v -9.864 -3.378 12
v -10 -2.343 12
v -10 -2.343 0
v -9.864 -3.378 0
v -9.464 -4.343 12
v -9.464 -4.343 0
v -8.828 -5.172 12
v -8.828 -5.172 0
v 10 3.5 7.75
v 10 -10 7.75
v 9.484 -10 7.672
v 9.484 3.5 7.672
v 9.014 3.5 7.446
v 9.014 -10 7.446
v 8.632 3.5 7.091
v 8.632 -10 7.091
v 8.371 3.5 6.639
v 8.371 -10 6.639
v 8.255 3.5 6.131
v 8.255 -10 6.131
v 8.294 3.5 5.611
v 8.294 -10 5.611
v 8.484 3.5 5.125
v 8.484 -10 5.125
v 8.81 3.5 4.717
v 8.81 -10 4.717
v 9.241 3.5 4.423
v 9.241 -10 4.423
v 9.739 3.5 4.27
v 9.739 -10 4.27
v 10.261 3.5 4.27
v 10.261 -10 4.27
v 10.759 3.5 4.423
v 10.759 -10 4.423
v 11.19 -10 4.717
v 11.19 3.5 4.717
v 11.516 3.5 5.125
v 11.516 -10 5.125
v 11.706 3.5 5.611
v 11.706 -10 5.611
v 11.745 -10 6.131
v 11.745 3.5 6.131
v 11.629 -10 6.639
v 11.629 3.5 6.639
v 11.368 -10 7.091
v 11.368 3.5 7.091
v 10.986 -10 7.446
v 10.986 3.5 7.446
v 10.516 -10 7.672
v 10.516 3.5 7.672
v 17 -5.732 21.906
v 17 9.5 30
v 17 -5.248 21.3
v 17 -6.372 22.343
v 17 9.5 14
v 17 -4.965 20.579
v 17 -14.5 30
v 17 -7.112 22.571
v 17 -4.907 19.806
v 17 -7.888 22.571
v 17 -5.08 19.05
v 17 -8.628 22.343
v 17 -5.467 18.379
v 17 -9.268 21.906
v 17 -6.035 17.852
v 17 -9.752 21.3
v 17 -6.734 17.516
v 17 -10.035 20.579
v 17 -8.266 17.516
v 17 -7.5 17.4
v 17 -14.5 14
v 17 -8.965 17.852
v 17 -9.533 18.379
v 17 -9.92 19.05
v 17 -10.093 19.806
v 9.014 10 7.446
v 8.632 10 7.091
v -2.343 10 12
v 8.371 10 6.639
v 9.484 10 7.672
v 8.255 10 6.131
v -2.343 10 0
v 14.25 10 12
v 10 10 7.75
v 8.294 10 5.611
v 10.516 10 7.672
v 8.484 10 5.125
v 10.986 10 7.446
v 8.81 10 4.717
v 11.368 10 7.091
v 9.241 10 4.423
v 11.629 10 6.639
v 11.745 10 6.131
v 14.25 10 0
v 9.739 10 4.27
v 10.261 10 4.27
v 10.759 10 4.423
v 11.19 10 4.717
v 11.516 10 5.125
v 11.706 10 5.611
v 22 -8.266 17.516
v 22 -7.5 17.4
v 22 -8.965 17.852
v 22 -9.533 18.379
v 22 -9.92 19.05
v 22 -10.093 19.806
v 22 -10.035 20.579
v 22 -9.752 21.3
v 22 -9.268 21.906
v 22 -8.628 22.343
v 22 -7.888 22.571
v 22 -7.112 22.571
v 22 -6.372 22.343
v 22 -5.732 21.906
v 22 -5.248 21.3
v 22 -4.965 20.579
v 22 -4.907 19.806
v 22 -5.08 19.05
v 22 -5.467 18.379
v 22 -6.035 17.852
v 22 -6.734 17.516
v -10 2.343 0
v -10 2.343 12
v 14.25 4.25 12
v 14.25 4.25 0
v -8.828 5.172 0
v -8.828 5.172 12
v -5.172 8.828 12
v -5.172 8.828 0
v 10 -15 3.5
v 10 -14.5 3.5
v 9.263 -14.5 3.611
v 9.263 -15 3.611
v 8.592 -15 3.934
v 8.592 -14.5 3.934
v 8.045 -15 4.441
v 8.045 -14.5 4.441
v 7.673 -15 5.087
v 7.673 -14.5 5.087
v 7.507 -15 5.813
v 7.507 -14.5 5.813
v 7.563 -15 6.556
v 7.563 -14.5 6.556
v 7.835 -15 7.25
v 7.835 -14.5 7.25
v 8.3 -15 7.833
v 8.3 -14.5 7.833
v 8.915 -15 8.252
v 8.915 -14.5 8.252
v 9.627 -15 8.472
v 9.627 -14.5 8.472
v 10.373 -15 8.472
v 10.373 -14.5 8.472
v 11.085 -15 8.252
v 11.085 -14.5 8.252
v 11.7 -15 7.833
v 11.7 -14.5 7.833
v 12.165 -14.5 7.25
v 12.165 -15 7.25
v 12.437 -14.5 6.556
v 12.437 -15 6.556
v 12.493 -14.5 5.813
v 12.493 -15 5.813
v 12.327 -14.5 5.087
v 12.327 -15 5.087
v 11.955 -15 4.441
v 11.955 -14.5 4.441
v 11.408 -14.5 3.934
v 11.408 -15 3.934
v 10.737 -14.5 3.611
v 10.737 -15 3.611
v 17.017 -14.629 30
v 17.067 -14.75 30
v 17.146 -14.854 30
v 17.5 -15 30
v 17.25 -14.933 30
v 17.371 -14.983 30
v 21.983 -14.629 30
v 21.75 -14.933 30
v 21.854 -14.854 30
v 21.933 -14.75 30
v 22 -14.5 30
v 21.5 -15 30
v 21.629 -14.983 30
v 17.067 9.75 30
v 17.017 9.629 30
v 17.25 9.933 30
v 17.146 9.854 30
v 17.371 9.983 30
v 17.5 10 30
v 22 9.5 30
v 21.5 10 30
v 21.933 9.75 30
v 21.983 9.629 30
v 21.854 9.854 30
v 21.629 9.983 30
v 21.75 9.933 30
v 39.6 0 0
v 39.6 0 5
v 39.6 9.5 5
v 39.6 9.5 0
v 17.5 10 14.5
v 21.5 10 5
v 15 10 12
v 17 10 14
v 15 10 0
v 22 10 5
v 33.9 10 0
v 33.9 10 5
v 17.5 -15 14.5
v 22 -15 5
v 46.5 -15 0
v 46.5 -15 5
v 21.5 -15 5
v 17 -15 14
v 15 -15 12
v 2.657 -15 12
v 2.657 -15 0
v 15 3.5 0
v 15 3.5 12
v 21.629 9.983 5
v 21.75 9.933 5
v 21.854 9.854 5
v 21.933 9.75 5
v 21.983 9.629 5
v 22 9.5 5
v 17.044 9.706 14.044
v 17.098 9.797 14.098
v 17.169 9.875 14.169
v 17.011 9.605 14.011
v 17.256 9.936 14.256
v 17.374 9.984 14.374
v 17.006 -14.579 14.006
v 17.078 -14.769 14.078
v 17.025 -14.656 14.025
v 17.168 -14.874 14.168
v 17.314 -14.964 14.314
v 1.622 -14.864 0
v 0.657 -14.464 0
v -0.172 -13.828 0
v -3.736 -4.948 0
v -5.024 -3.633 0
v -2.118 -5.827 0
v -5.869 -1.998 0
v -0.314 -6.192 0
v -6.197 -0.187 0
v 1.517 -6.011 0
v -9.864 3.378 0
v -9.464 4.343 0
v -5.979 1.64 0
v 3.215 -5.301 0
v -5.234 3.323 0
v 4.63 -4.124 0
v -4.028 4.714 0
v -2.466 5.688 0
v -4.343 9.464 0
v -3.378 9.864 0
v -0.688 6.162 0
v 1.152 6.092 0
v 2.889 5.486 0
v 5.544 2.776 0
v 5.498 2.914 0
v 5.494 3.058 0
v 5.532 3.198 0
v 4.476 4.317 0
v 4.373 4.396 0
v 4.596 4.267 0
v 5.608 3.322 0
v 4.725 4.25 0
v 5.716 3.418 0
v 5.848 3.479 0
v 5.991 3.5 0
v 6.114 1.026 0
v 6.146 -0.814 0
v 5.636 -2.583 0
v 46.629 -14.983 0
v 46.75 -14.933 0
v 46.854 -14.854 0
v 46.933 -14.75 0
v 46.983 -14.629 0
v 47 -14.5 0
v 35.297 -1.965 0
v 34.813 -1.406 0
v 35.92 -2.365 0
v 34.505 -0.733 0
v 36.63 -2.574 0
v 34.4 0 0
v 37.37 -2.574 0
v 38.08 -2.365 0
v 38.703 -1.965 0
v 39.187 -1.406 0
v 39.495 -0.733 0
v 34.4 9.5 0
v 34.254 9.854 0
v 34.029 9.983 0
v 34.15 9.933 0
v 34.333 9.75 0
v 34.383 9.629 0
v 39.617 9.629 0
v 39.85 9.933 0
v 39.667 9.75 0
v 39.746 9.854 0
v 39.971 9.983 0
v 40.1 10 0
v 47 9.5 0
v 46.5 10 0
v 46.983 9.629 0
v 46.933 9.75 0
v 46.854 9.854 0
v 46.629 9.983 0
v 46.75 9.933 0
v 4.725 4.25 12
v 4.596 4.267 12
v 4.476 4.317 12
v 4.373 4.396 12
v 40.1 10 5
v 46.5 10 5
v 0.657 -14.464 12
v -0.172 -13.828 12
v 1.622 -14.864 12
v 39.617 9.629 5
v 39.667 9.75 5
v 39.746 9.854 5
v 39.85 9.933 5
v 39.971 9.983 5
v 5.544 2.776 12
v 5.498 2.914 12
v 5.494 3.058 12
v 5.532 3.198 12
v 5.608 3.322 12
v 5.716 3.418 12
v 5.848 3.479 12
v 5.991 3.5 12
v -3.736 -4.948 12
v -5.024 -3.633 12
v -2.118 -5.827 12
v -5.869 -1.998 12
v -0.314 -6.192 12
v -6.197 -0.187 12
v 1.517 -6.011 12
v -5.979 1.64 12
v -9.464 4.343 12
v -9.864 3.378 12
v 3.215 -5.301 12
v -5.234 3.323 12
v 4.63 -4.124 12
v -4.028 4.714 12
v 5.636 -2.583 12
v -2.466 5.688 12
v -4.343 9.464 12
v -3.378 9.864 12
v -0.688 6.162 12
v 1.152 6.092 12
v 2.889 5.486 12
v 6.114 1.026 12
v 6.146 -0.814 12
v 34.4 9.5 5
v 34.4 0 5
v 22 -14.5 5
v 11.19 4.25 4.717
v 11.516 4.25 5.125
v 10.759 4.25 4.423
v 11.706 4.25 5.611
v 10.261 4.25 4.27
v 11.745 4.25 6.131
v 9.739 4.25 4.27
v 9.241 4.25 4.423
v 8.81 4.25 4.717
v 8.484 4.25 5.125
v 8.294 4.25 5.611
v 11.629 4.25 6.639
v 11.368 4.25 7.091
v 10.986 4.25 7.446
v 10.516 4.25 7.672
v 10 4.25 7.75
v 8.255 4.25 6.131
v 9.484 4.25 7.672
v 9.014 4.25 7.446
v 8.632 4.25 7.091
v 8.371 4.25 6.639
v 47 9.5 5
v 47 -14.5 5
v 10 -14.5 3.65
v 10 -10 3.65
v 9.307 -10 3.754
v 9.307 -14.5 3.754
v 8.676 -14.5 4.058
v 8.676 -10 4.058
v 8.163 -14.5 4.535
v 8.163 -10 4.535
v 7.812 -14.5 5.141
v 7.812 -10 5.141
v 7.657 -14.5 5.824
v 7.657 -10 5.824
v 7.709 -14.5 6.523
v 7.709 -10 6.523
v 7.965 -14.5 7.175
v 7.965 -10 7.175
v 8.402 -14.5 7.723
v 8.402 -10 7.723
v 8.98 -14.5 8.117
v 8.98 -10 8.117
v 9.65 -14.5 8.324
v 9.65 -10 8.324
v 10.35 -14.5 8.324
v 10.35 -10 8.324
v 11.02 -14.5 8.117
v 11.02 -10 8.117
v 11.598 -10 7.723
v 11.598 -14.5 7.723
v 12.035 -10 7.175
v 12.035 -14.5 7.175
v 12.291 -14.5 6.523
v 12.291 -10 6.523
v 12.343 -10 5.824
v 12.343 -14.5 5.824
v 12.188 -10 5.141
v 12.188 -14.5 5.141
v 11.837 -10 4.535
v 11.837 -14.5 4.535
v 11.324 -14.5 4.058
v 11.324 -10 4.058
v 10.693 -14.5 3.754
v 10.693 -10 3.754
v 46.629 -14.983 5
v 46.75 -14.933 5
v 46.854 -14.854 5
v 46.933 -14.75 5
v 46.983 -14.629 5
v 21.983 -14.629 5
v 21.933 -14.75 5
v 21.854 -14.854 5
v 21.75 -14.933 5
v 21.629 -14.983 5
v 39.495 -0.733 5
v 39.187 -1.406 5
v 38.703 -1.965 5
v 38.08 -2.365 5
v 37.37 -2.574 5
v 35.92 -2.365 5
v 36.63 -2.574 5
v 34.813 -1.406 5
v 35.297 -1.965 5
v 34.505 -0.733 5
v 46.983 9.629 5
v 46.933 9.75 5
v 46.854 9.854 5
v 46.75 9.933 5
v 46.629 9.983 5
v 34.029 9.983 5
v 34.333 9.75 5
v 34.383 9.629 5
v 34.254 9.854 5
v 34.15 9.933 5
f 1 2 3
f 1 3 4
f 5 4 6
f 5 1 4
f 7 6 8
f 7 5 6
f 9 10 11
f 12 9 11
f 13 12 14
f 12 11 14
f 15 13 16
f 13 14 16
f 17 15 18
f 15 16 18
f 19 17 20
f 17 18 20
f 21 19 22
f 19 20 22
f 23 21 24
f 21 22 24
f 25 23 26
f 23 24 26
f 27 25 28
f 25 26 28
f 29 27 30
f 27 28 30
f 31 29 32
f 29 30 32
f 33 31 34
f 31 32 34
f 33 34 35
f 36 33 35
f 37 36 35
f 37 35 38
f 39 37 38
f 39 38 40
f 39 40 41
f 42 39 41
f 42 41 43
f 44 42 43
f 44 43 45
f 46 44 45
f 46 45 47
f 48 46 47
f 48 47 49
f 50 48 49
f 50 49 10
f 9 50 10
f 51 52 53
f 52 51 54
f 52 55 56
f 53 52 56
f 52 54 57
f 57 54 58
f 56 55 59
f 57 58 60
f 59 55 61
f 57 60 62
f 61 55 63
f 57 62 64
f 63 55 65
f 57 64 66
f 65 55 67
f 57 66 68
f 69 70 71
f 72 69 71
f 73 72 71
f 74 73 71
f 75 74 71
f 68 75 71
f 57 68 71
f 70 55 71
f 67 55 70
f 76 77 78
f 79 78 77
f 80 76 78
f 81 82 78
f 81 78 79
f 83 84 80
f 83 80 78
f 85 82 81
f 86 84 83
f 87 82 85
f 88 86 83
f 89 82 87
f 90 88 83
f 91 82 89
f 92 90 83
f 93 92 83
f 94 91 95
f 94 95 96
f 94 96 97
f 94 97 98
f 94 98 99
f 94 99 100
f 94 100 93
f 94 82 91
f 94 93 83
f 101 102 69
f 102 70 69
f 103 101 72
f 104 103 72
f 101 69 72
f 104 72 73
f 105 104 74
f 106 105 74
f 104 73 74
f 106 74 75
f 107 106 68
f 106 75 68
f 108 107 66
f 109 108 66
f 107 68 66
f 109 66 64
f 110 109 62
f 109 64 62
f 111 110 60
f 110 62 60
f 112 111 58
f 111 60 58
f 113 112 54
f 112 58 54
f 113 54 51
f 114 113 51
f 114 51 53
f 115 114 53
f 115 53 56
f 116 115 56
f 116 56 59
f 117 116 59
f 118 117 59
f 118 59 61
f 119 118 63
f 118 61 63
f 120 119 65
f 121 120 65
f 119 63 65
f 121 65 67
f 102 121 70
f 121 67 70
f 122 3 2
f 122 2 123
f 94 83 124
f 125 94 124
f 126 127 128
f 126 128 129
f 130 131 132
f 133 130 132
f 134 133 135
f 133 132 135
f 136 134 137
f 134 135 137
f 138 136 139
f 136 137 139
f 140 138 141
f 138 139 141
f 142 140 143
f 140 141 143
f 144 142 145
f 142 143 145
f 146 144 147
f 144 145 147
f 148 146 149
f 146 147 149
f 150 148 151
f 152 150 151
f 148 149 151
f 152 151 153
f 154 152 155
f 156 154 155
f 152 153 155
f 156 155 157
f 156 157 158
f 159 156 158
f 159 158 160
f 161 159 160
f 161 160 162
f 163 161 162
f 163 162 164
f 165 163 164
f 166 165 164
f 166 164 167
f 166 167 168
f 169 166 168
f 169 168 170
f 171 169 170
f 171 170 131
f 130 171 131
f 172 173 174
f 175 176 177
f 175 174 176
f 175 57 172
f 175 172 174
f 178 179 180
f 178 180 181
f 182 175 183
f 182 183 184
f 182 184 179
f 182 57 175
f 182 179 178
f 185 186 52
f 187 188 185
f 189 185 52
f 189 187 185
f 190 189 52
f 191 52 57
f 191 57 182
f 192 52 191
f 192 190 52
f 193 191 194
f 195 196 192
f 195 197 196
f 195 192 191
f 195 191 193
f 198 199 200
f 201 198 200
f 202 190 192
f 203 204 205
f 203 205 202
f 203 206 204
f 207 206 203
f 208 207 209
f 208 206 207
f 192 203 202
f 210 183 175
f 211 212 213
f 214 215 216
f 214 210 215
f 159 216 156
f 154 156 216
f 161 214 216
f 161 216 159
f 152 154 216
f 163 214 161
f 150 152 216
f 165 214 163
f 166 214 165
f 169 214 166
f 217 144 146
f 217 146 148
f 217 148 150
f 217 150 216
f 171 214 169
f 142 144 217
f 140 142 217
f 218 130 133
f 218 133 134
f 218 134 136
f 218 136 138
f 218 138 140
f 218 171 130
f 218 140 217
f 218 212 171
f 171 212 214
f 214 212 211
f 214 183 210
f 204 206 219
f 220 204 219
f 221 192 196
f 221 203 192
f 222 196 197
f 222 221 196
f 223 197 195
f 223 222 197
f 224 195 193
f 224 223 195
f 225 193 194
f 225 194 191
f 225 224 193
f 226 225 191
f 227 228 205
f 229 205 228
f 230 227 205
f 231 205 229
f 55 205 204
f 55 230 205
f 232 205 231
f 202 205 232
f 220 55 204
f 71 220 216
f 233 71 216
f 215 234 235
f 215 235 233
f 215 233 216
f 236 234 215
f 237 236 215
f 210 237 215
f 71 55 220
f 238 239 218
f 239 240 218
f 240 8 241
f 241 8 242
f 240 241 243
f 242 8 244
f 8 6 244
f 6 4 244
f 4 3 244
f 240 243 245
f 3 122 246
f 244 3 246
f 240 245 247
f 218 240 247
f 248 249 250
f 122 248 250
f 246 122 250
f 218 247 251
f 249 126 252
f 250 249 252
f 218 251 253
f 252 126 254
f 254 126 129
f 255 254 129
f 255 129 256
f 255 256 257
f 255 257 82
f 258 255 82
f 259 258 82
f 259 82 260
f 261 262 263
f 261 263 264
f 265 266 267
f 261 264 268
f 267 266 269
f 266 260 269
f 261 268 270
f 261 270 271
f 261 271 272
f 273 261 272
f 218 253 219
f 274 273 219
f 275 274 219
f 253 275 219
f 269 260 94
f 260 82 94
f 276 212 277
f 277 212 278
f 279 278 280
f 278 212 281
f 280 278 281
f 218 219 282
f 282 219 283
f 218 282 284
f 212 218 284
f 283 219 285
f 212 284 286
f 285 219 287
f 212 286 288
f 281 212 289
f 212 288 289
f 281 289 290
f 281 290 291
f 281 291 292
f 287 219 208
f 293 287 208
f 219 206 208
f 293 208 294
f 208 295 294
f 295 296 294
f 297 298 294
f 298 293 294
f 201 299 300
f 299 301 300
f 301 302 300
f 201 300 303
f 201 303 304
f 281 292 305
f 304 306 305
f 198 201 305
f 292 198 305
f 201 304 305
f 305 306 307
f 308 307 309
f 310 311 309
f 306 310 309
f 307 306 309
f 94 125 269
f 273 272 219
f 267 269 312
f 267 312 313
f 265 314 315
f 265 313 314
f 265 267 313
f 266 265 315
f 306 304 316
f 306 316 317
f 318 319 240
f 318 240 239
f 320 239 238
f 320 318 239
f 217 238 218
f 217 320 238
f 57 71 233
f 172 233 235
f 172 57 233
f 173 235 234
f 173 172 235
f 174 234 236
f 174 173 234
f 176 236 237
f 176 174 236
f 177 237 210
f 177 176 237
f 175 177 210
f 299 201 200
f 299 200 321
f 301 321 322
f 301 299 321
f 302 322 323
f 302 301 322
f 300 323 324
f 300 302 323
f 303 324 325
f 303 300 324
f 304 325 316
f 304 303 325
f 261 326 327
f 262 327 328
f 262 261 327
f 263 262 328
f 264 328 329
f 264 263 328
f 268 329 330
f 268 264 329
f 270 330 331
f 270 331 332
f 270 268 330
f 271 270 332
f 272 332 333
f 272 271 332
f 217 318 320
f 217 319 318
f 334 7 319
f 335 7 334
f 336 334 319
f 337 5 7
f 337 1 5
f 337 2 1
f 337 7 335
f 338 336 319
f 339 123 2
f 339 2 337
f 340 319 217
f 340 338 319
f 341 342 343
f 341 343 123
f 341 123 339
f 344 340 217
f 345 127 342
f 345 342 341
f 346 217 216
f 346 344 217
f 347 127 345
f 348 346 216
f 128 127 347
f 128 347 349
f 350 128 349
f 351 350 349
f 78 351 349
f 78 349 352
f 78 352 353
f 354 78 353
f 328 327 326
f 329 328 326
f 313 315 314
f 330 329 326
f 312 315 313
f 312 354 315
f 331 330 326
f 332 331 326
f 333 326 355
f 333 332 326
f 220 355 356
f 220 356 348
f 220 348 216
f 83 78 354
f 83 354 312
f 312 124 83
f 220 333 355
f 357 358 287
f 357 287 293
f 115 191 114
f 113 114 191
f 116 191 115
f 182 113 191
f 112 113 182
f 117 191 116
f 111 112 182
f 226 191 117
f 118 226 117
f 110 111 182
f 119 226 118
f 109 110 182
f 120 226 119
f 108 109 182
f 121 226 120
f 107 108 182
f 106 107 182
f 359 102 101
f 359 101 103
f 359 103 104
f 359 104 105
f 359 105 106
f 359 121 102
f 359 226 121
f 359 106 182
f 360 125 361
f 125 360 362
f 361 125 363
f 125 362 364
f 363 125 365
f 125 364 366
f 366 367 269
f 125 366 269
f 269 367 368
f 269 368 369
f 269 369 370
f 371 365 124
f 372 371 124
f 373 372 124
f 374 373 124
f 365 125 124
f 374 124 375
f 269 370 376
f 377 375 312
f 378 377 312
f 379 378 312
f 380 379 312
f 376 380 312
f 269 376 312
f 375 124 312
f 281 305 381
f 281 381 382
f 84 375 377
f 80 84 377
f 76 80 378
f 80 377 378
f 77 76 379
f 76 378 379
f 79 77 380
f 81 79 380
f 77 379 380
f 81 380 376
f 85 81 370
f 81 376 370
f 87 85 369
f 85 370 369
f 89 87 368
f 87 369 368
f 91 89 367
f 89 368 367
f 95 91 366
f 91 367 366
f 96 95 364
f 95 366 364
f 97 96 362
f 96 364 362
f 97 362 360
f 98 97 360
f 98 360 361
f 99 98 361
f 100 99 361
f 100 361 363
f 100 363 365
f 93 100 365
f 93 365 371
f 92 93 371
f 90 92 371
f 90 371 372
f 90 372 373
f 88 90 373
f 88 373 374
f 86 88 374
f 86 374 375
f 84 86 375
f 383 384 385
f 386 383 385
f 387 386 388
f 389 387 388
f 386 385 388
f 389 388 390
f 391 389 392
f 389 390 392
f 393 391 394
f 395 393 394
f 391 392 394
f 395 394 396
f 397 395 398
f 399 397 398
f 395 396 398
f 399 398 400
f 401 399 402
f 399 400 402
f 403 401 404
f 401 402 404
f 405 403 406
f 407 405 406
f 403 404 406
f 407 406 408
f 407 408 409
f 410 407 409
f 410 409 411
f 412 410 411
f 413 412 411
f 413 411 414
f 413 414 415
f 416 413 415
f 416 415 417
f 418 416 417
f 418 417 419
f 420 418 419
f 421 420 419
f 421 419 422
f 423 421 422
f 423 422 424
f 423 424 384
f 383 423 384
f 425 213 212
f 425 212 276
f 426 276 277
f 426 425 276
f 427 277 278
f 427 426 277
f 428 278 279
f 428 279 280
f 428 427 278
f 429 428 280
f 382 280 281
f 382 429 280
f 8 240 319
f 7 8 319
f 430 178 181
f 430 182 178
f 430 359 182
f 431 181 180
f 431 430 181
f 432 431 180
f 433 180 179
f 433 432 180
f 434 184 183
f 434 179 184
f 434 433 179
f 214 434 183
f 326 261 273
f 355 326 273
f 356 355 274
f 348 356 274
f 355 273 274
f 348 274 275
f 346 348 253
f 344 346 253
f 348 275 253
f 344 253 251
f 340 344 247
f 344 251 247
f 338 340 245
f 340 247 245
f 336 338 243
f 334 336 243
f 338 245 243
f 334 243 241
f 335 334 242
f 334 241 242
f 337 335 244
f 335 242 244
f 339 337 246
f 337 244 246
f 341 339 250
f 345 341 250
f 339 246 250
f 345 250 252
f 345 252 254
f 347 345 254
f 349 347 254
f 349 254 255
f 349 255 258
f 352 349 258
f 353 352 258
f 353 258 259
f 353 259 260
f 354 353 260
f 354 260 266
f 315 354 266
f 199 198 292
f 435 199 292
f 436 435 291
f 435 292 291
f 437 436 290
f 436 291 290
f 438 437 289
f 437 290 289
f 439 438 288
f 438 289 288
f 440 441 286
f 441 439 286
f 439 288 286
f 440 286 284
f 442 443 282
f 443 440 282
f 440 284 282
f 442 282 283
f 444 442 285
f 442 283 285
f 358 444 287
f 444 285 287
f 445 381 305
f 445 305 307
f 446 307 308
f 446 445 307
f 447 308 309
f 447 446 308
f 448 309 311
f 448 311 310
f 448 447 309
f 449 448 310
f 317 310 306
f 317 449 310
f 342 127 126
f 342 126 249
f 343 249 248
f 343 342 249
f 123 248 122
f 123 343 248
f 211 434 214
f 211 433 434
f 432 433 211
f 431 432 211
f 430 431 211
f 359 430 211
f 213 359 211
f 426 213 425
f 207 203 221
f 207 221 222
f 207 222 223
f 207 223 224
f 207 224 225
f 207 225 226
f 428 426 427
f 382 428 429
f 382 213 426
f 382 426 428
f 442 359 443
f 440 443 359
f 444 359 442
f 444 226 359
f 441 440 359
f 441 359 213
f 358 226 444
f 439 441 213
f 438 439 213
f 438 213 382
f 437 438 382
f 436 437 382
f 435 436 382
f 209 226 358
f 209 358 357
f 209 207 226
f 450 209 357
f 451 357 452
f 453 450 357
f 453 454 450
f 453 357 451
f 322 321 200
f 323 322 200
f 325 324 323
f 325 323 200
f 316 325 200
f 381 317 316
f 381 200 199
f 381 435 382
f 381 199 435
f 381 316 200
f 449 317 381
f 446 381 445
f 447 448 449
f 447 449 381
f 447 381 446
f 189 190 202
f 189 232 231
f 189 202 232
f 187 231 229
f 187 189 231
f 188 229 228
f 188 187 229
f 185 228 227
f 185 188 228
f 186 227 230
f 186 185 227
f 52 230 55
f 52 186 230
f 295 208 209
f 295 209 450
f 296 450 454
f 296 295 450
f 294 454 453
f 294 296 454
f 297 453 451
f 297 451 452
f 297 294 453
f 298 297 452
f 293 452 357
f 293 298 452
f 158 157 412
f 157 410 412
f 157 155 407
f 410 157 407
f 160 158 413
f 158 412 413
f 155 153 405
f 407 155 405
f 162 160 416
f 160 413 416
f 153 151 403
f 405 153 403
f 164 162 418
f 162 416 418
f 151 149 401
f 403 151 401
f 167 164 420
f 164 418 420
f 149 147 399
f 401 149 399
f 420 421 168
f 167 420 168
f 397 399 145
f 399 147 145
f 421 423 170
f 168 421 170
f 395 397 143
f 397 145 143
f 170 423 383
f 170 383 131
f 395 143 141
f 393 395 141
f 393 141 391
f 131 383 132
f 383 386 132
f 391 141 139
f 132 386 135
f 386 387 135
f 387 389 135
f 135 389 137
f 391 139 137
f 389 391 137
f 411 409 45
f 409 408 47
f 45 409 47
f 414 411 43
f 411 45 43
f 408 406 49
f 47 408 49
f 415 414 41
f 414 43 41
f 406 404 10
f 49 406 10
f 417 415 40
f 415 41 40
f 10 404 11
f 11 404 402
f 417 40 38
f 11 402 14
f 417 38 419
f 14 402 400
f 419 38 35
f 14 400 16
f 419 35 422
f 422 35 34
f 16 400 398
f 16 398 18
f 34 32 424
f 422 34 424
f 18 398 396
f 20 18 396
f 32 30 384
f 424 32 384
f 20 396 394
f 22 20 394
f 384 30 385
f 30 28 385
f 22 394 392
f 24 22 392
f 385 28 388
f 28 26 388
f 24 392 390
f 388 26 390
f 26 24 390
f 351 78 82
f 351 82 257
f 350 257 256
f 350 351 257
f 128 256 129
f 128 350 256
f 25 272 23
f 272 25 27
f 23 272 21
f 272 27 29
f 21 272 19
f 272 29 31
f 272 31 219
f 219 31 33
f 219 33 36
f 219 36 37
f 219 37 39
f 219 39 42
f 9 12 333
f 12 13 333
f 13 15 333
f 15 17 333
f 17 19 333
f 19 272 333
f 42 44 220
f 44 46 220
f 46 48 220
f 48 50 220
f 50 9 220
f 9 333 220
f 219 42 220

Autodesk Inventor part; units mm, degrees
ref_plane "YZ Plane" through (0, 0, 0) normal (1, 0, 0) x (0, 1, 0)
ref_plane "XZ Plane" through (0, 0, 0) normal (0, 1, 0) x (-1, 0, 0)
ref_plane "XY Plane" through (0, 0, 0) normal (0, 0, 1) x (1, 0, 0)
sketch "Sketch1" plane through (0, 0, 0) normal (0, 0, 1) x (1, 0, 0)
  circle A0 centre (0, 0) radius 6.2
  line L0 (0, 0) -> (83.2978, 0) construction
  circle A1 centre (37, 0) radius 2.6
  line L1 (-10, 10) -> (47, 10)
  line L2 (47, 10) -> (47, -15)
  line L3 (47, -15) -> (-10, -15)
  line L4 (-10, -15) -> (-10, 10)
  line L5 (22, 29.5766) -> (22, -18.8569) construction
  dimension "d0" = 12.4
  dimension "d1" = 5.2
  dimension "d2" = 37
  dimension "d3" = 10
  dimension "d4" = 15
  dimension "d5" = 10
  dimension "d6" = 22
  dimension "d7" = 25
extrude "Extrusion1" add sketch "Sketch1" along normal blind 5
sketch "Sketch2" plane through (0, 0, 5) normal (0, 0, 1) x (1, 0, 0)
  circle A0 centre (0, 0) radius 6.2 projected
  circle A1 centre (37, 0) radius 2.6 projected
  line L0 (47, 10) -> (-10, 10) projected
  line L1 (-10, 10) -> (-10, -15) projected
  line L2 (-10, -15) -> (47, -15) projected
  line L3 (47, -15) -> (47, 10) projected
  line L4 (22, 10) -> (22, -15)
  dimension "d10" = 22
extrude "Extrusion2" add sketch "Sketch2" along normal blind 7 contours L4 L2 L1 L0
sketch "Sketch3" plane through (0, 0, 12) normal (0, 0, 1) x (1, 0, 0)
  point P0 (0, 0)
sketch "Sketch4" plane through (0, 0, 5) normal (0, 0, 1) x (1, 0, 0)
  circle A0 centre (0, 0) radius 6.2 projected
  line L0 (-10, 10) -> (-10, -15) projected
  line L1 (-10, -15) -> (22, -15) projected
  line L2 (22, -15) -> (22, 10) projected
  line L3 (22, 10) -> (-10, 10) projected
  line L4 (22, 10) -> (17, 10)
  line L5 (17, 10) -> (17, -15)
  line L6 (17, -15) -> (22, -15)
  line L7 (22, -15) -> (22, 10)
  dimension "d13" = 5
extrude "Extrusion3" add sketch "Sketch4" along normal blind 25 contours L3 L2 L1 L5
chamfer "Chamfer1" distance 6 angle 45 1 edges at (-10, 10, 6)
chamfer "Chamfer2" distance 2 angle 45 1 edges at (17, -2.5, 12)
chamfer "Chamfer3" distance 11 angle 45 1 edges at (-10, -15, 6)
sketch "Sketch5" plane through (22, -15, 5) normal (1, 0, 0) x (0, 0, -1)
  line L0 (0, 25) -> (0, 0) construction
  line L1 (-9, 0) -> (-25, 0) projected
  point P0 (5, 15)
  point P1 (-15, 7.5)
  dimension "d22" = 15
  dimension "d62" = 7.5
hole "Hole1" at (22, -7.5, 20) direction (-1, 0, 0) diameter 5.2 end through all
sketch "Sketch6" plane through (0, 0, 5) normal (0, 0, 1) x (1, 0, 0)
  line L0 (22, 10) -> (22, -15) projected
  line L1 (22, -15) -> (47, -15) projected
  line L2 (47, -15) -> (47, 10) projected
  line L3 (47, 10) -> (22, 10) projected
  circle A0 centre (37, 0) radius 2.6 projected
  line L4 (39.6, 0) -> (39.6, 10)
  circle A1 centre (37, 0) radius 2.6 projected
  line L5 (34.4, 0) -> (34.4, 10)
  line L6 (-4, 10) -> (47, 10) projected
  circle A2 centre (37, 0) radius 2.6 projected
  point P0 (0, 0)
extrude "Extrusion4" cut sketch "Sketch6" against normal through all contours L3 L4 A0 L5
sketch "Sketch7" plane through (0, 0, 12) normal (0, 0, 1) x (1, 0, 0)
  line L0 (15, 10) -> (15, -15) projected
  line L1 (15, 10) -> (-4, 10) projected
  line L2 (-10, 4) -> (-4, 10) projected
  line L3 (-10, 4) -> (-10, -4) projected
  line L4 (1, -15) -> (15, -15) projected
  circle A0 centre (0, 0) radius 6.2 projected
  line L5 (14.25, 10) -> (14.25, 4.25)
  line L6 (14.25, 4.25) -> (4.5141, 4.25)
  line L7 (5.1176, 3.5) -> (15, 3.5)
  line L8 (1, -15) -> (-10, -4) projected
  dimension "d33" = 0.75
  dimension "d34" = 0.75
  dimension "d35" = 3.5
extrude "Extrusion5" cut sketch "Sketch7" against normal through all contours L0 L7 A0 L6 L5 L1
fillet "Fillet1" radius 0.5 1 edges at (5.1176, 3.5, 6)
fillet "Fillet2" radius 0.5 1 edges at (4.5141, 4.25, 6)
sketch "Sketch8" plane through (-4, 10, 12) normal (0, 1, 0) x (1, 0, 0)
  line L0 (18.25, 0) -> (18.25, 12) projected
  line L1 (0, 12) -> (18.25, 12) projected
  line L2 (0, 0) -> (0, 12) projected
  line L3 (18.25, 0) -> (0, 0) projected
  point P0 (4, 12)
  point P1 (14, 6)
  dimension "d40" = 10
  dimension "d41" = 6
hole "Hole2" at (10, 10, 6) direction (0, -1, 0) diameter 3.5 end through all
sketch "Sketch9" plane through (47, -15, 0) normal (0, -1, 0) x (1, 0, 0)
  circle A0 centre (-37, 6) radius 1.75 projected
  circle A1 centre (-37, 6) radius 1.75 projected
  point P0 (-47, 0)
  point P1 (-37, 6)
hole "Hole3" at (10, -15, 6) direction (0, 1, 0) diameter 4.7 depth 5 counterbore diameter 5 counterbore depth 0.5
fillet "Fillet4" radius 0.5 8 edges at (34.4, 10, 2.5) (39.6, 10, 2.5) (47, 10, 2.5) (47, -15, 2.5) (22, 10, 17.5) (17, 10, 22) (22, -15, 17.5) (17, -15, 22)
fillet "Fillet5" radius 4 4 edges at (-4, 10, 6) (-10, 4, 6) (-10, -4, 6) (1, -15, 6)
properties part number "Z Axis Linear Rail Bracket - Left 1.0" material "PC/ABS Plastic"
